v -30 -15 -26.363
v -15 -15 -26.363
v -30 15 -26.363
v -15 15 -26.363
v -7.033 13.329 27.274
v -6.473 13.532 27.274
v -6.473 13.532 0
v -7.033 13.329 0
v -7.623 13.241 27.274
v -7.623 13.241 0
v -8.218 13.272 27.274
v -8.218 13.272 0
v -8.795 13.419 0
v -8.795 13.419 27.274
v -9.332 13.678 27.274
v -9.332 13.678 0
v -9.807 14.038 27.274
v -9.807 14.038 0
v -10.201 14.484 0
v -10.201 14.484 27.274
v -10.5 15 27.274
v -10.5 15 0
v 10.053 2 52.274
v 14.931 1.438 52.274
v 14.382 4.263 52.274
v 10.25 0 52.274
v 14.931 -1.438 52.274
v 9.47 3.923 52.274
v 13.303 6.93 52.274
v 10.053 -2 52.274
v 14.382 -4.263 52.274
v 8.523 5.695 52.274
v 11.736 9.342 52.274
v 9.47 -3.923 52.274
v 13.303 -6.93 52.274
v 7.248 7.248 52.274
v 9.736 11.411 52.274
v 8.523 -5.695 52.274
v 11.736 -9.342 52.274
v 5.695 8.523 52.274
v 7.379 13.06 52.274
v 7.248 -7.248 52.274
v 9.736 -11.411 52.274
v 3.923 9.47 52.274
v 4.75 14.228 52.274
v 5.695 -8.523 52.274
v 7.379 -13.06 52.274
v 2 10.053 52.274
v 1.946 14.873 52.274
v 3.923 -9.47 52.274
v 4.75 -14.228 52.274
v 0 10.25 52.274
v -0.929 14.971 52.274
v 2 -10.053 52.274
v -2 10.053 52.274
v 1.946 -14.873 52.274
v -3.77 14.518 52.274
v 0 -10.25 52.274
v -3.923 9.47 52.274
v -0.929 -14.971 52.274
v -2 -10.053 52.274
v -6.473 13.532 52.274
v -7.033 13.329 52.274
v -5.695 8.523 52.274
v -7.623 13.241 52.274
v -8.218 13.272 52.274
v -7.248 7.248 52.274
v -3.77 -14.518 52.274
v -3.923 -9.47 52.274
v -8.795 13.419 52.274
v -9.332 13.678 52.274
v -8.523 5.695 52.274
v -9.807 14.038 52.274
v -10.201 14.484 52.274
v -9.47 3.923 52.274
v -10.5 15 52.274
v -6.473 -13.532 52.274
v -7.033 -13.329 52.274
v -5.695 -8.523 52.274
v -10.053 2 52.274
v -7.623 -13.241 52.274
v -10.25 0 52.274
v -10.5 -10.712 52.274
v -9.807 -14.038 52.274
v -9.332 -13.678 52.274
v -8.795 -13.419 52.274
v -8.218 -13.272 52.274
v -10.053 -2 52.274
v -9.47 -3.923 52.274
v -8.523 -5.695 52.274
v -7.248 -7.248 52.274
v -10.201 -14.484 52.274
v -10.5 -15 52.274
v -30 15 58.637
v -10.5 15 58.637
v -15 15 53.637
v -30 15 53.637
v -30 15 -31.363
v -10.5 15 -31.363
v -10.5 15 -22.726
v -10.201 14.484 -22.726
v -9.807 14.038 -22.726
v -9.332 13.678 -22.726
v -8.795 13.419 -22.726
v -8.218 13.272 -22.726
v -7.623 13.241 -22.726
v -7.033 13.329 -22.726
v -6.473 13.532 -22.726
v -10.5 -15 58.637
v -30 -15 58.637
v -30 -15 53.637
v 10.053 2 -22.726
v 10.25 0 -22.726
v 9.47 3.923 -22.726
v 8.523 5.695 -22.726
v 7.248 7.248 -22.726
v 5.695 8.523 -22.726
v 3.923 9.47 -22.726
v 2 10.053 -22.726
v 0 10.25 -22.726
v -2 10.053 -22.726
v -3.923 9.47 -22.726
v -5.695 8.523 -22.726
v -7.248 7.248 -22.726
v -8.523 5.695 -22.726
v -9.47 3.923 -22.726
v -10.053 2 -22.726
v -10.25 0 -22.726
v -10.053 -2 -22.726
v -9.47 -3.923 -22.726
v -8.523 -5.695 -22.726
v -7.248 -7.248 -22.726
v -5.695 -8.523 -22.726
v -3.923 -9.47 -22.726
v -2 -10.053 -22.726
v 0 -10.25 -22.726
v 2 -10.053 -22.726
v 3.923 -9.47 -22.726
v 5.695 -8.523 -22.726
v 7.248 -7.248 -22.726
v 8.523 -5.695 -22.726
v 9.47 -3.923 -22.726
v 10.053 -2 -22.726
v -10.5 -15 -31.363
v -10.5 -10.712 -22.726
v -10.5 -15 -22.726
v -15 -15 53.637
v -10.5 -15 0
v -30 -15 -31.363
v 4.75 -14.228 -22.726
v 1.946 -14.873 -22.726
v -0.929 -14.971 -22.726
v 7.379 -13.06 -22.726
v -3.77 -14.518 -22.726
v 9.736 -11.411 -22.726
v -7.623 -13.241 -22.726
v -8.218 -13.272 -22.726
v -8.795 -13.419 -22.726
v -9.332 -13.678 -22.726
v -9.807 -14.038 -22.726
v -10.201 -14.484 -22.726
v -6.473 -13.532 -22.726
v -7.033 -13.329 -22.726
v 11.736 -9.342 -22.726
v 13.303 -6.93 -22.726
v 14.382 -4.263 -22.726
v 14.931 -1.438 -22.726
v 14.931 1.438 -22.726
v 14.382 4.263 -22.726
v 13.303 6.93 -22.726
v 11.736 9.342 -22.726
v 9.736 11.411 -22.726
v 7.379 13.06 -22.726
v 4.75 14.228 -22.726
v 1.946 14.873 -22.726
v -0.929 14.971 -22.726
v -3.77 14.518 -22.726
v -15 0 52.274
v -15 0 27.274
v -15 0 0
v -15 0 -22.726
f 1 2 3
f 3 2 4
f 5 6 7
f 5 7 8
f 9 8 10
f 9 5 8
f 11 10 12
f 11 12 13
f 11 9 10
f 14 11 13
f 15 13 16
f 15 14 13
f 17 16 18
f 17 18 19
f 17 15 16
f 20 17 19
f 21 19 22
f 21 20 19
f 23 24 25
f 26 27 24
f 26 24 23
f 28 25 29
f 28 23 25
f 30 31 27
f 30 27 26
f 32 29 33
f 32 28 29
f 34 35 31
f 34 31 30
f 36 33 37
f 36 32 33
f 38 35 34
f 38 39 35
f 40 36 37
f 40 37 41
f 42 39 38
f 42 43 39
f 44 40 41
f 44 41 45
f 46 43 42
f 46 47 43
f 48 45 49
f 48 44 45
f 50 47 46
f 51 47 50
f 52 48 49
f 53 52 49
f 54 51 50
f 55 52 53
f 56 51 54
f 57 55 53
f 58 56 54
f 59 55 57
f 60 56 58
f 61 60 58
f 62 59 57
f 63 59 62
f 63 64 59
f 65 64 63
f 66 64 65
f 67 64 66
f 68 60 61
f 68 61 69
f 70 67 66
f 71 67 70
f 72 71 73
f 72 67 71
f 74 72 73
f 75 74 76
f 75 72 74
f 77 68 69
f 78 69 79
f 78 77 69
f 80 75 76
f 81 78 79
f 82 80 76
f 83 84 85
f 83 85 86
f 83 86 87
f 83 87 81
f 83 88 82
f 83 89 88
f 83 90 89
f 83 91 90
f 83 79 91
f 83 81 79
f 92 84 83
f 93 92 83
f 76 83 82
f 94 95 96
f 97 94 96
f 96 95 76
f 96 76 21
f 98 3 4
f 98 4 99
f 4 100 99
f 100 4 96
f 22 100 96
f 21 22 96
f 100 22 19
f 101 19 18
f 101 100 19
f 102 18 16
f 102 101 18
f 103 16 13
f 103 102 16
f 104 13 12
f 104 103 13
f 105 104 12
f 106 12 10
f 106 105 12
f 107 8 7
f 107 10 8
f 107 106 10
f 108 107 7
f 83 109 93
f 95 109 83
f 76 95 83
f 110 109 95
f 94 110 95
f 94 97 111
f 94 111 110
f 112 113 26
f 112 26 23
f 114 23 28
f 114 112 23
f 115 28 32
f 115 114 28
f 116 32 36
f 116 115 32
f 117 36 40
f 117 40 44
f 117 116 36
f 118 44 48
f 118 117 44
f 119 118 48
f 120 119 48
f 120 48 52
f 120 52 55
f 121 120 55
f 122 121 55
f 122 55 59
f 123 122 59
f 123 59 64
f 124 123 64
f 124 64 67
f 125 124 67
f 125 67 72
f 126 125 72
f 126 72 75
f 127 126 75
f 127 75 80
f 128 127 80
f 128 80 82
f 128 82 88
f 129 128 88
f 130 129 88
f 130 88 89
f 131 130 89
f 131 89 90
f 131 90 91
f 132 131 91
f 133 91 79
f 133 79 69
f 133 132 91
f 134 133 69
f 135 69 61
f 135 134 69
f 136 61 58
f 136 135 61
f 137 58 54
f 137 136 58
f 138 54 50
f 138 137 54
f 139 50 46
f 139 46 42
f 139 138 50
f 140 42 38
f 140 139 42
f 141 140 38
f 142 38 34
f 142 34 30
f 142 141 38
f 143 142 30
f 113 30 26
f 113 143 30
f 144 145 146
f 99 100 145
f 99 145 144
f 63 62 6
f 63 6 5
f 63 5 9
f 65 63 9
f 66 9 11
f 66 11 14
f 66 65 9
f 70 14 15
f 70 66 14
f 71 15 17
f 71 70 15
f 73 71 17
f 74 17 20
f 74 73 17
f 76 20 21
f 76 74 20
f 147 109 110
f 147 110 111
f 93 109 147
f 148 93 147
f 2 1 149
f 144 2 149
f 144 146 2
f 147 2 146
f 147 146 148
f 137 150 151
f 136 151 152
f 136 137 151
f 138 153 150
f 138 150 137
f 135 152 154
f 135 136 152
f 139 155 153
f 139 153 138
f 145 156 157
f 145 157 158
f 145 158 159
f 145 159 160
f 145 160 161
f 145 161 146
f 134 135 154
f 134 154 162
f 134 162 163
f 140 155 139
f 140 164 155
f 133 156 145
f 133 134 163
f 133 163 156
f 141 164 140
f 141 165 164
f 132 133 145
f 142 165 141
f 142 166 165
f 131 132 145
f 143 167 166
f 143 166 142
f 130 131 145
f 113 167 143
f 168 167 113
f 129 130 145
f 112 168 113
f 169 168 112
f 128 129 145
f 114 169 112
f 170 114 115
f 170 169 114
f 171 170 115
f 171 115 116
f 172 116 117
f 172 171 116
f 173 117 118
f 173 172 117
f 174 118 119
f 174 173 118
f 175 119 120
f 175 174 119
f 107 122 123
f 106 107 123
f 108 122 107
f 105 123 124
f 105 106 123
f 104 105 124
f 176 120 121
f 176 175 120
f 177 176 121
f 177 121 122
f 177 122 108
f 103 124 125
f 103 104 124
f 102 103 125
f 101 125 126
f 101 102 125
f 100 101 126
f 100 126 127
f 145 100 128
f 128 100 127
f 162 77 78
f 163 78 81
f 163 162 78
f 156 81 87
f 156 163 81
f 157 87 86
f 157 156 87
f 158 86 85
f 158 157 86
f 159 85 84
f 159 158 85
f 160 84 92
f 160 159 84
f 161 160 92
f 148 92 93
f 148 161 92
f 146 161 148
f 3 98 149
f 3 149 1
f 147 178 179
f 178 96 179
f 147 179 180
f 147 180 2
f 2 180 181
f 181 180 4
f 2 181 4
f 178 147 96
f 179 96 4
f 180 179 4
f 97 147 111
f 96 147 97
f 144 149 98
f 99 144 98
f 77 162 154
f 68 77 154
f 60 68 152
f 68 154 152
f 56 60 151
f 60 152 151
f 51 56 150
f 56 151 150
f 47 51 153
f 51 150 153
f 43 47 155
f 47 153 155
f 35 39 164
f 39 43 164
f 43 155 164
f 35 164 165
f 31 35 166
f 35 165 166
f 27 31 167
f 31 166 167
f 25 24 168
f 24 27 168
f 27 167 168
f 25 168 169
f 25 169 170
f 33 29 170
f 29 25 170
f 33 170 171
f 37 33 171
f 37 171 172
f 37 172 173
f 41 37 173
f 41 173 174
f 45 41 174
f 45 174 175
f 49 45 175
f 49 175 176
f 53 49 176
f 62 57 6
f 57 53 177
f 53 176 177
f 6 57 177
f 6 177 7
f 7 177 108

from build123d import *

# Parameters (mm, degrees)
SKETCH_1_W            = 30
SKETCH_1_H            = 30
SKETCH_1_R            = 9.807439468
EXTRUDE_1_DEPTH       = 60
SKETCH_2_W            = 30
SKETCH_2_H            = 30
SKETCH_2_R            = 10.25
EXTRUDE_2_DEPTH       = 50
SKETCH_6_R            = 10.25
CUT_EXTRUDE_1_DEPTH   = 60
SKETCH_7_W            = 30
SKETCH_7_H            = 30
SKETCH_7_R            = 10.25
REVOLVE_1_ANGLE       = 90
FILLET_2_R            = 15
SKETCH_9_W            = 65.452723958
SKETCH_9_H            = 141.93468868
CUT_EXTRUDE_3_DEPTH   = 30
SKETCH_19_W           = 90
SKETCH_19_H           = 60
EXTRUDE_9_DEPTH       = 4.5
SKETCH_20_W           = 5
SKETCH_20_H           = 60
EXTRUDE_10_DEPTH      = 15
EXTRUDE_11_DEPTH      = 25
EXTRUDE_11_DEPTH_BACK = 50
SKETCH_22_R           = 15
SKETCH_22_R_2         = 10.25
SKETCH_26_W           = 90
SKETCH_26_H           = 15
CUT_EXTRUDE_4_DEPTH   = 20
FILLET_4_R            = 3


with BuildPart() as part:
    # 스케치1 → 보스-돌출1 (new body)
    with BuildSketch(Plane.XY):
        Rectangle(SKETCH_1_W, SKETCH_1_H)
        Circle(SKETCH_1_R, mode=Mode.SUBTRACT)
    extrude(amount=EXTRUDE_1_DEPTH)

    # 스케치6 → 컷-돌출1 (cut)
    with BuildSketch(Plane.XY.offset(60)):
        Circle(SKETCH_6_R)
    extrude(amount=-CUT_EXTRUDE_1_DEPTH, mode=Mode.SUBTRACT)



with BuildPart() as body_2:
    # 스케치2 → 보스-돌출2 (new body)
    with BuildSketch(Plane.XZ.offset(15)):
        with Locations((0, 75)):
            Rectangle(SKETCH_2_W, SKETCH_2_H)
        with Locations((0, 75)):
            Circle(SKETCH_2_R, mode=Mode.SUBTRACT)
    extrude(amount=EXTRUDE_2_DEPTH)


with BuildPart() as part_1:
    add(part.part)

    add(body_2.part)  # 회전1 merges body 2
    # 스케치7 → 회전1 (revolve)
    with BuildSketch(Plane(origin=(0, -15, 0), x_dir=(1, 0, 0), z_dir=(0, 1, 0))):
        with Locations((0, -75)):
            Rectangle(SKETCH_7_W, SKETCH_7_H)
        with Locations(Location((0, -75, 0), (0, 0, 270))):
            Circle(SKETCH_7_R, mode=Mode.SUBTRACT)
    revolve(axis=Axis((15, -15, 60), (-1, 0, 0)), revolution_arc=REVOLVE_1_ANGLE)

    # 필렛2
    # the kernel refuses this fillet: 15 mm, written as the material it adds along each edge
    with BuildSketch(Plane(origin=(15, -15, 60), x_dir=(0, 0, -1), z_dir=(-1, 0, 0))) as fillet_2_piece_1:
        with BuildLine():
            CenterArc((FILLET_2_R, FILLET_2_R), FILLET_2_R, 180, 90)
            Line((0, FILLET_2_R), (0, 0))
            Line((0, 0), (FILLET_2_R, 0))
        make_face()
    extrude(amount=30)
    # the kernel refuses this fillet: 15 mm, written as the material it takes off along each edge
    with BuildSketch(Plane(origin=(15, -15, 60), x_dir=(0, 0, 1), z_dir=(0, -1, 0))) as fillet_2_2_piece_1:
        with BuildLine():
            CenterArc((30 - FILLET_2_R, FILLET_2_R), FILLET_2_R, 270, 90)
            Line((30, FILLET_2_R), (30, 0))
            Line((30, 0), (30 - FILLET_2_R, 0))
        make_face()
    revolve(axis=Axis((15, -15, 60), (-1, 0, 0)), revolution_arc=90, mode=Mode.SUBTRACT)
    with BuildSketch(Plane(origin=(-15, -15, 60), x_dir=(0, 0, 1), z_dir=(0, -1, 0))) as fillet_2_2_piece_2:
        with BuildLine():
            CenterArc((30 - FILLET_2_R, -FILLET_2_R), FILLET_2_R, 0, 90)
            Line((30, -FILLET_2_R), (30, 0))
            Line((30, 0), (30 - FILLET_2_R, 0))
        make_face()
    revolve(axis=Axis((-15, -15, 60), (-1, 0, 0)), revolution_arc=90, mode=Mode.SUBTRACT)
    with BuildSketch(Plane(origin=(-15, 15, -37.5), x_dir=(0, -1, 0), z_dir=(0, 0, 1))) as fillet_2_2_piece_3:
        with BuildLine():
            CenterArc((FILLET_2_R, FILLET_2_R), FILLET_2_R, 180, 90)
            Line((0, FILLET_2_R), (0, 0))
            Line((0, 0), (FILLET_2_R, 0))
        make_face()
    extrude(amount=97.5, mode=Mode.SUBTRACT)
    with BuildSketch(Plane(origin=(15, 15, -37.5), x_dir=(0, -1, 0), z_dir=(0, 0, 1))) as fillet_2_2_piece_4:
        with BuildLine():
            CenterArc((FILLET_2_R, -FILLET_2_R), FILLET_2_R, 90, 90)
            Line((0, -FILLET_2_R), (0, 0))
            Line((0, 0), (FILLET_2_R, 0))
        make_face()
    extrude(amount=97.5, mode=Mode.SUBTRACT)
    with BuildSketch(Plane(origin=(-15, -15, 90), x_dir=(0, 0, -1), z_dir=(0, -1, 0))) as fillet_2_2_piece_5:
        with BuildLine():
            CenterArc((FILLET_2_R, FILLET_2_R), FILLET_2_R, 180, 90)
            Line((0, FILLET_2_R), (0, 0))
            Line((0, 0), (FILLET_2_R, 0))
        make_face()
    extrude(amount=87.5, mode=Mode.SUBTRACT)
    with BuildSketch(Plane(origin=(15, -15, 90), x_dir=(0, 0, -1), z_dir=(0, -1, 0))) as fillet_2_2_piece_6:
        with BuildLine():
            CenterArc((FILLET_2_R, -FILLET_2_R), FILLET_2_R, 90, 90)
            Line((0, -FILLET_2_R), (0, 0))
            Line((0, 0), (FILLET_2_R, 0))
        make_face()
    extrude(amount=87.5, mode=Mode.SUBTRACT)
    # the kernel refuses this fillet: 15 mm, written as the material it takes off along each edge
    with BuildSketch(Plane(origin=(-15, -15, 45), x_dir=(1, 0, 0), z_dir=(0, 0, -1)), Plane(origin=(15, -15, -37.5), x_dir=(-1, 0, 0), z_dir=(0, 0, 1))) as fillet_2_3_piece_1:
        with BuildLine():
            CenterArc((FILLET_2_R, -FILLET_2_R), FILLET_2_R, 90, 90)
            Line((0, -FILLET_2_R), (0, 0))
            Line((0, 0), (FILLET_2_R, 0))
        make_face()
    extrude(amount=82.5, mode=Mode.SUBTRACT)
    with BuildSketch(Plane(origin=(15, -30, 60), x_dir=(0, 0, 1), z_dir=(0, -1, 0))) as fillet_2_3_piece_2:
        with BuildLine():
            CenterArc((FILLET_2_R, FILLET_2_R), FILLET_2_R, 180, 90)
            Line((0, FILLET_2_R), (0, 0))
            Line((0, 0), (FILLET_2_R, 0))
        make_face()
    extrude(amount=72.5, mode=Mode.SUBTRACT)
    with BuildSketch(Plane(origin=(-15, -30, 60), x_dir=(0, 0, 1), z_dir=(0, -1, 0))) as fillet_2_3_piece_3:
        with BuildLine():
            CenterArc((FILLET_2_R, -FILLET_2_R), FILLET_2_R, 90, 90)
            Line((0, -FILLET_2_R), (0, 0))
            Line((0, 0), (FILLET_2_R, 0))
        make_face()
    extrude(amount=72.5, mode=Mode.SUBTRACT)
    with BuildSketch(Plane(origin=(-15, -30, 45), x_dir=(0, 1, 0), z_dir=(0, 0, -1))) as fillet_2_3_piece_4:
        with BuildLine():
            CenterArc((15 + FILLET_2_R, FILLET_2_R), FILLET_2_R, 180, 90)
            Line((15, FILLET_2_R), (15, 0))
            Line((15, 0), (15 + FILLET_2_R, 0))
        make_face()
    revolve(axis=Axis((-15, -30, 45), (1, 0, 0)), revolution_arc=90, mode=Mode.SUBTRACT)
    with BuildSketch(Plane(origin=(15, -30, 45), x_dir=(0, 1, 0), z_dir=(0, 0, -1))) as fillet_2_3_piece_5:
        with BuildLine():
            CenterArc((15 + FILLET_2_R, -FILLET_2_R), FILLET_2_R, 90, 90)
            Line((15 + FILLET_2_R, 0), (15, 0))
            Line((15, 0), (15, -FILLET_2_R))
        make_face()
    revolve(axis=Axis((15, -30, 45), (1, 0, 0)), revolution_arc=90, mode=Mode.SUBTRACT)

    # 스케치9 → 컷-돌출3 (cut)
    with BuildSketch(Plane(origin=(15, 0, 0), x_dir=(0, 0, -1), z_dir=(1, 0, 0))):
        with Locations((-60, 0)):
            Rectangle(SKETCH_9_W, SKETCH_9_H)
    extrude(amount=-CUT_EXTRUDE_3_DEPTH, mode=Mode.SUBTRACT)

    # 스케치19 → 보스-돌출9 (add)
    with BuildSketch(Plane(origin=(-15, -15, 60), x_dir=(0, 0, -1), z_dir=(1, 0, 0))):
        with Locations((46.36318099, 15)):
            Rectangle(SKETCH_19_W, SKETCH_19_H)
    extrude(amount=EXTRUDE_9_DEPTH)

    # 스케치20 → 보스-돌출10 (add)
    with BuildSketch(Plane.ZY.offset(15)):
        with Locations((56.13681901, 0)):
            Rectangle(SKETCH_20_W, SKETCH_20_H)
        with Locations((-28.86318099, 0)):
            Rectangle(SKETCH_20_W, SKETCH_20_H)
    extrude(amount=EXTRUDE_10_DEPTH)

    # 스케치22 → 보스-돌출11 (add, two sides: drawn at the far end of the back side and taken through both)
    with BuildSketch(Plane.XY.offset(27.273638021).offset(-EXTRUDE_11_DEPTH_BACK)):
        Circle(SKETCH_22_R)
        Circle(SKETCH_22_R_2, mode=Mode.SUBTRACT)
    extrude(amount=EXTRUDE_11_DEPTH + EXTRUDE_11_DEPTH_BACK)

    # 스케치26 → 컷-돌출4 (cut)
    with BuildSketch(Plane(origin=(-10.5, 0, 0), x_dir=(0, 0, -1), z_dir=(1, 0, 0))):
        with Locations((-13.63681901, -22.5)):
            Rectangle(SKETCH_26_W, SKETCH_26_H)
        with Locations((-13.63681901, 22.5)):
            Rectangle(SKETCH_26_W, SKETCH_26_H)
    extrude(amount=-CUT_EXTRUDE_4_DEPTH, mode=Mode.SUBTRACT)

    # 필렛4
    # the kernel refuses this fillet: 3 mm, written as the material it adds along each edge
    with BuildSketch(Plane(origin=(-10.5, -10.712142643, 27.273638021), x_dir=(0.8191977687507059, -0.573511129511769, 0), z_dir=(0, 0, -1))) as fillet_4_piece_1:
        with BuildLine():
            CenterArc((5.4076958, 2.959446042), FILLET_4_R, 169.374679788, 91.193748437)
            Line((2.459133916, 3.51260318), (2.400162678, 3.523666322))
            ThreePointArc((2.400162678, 3.523666322), (1.180415092, 1.790712258), (-0.049151866, 0.034410668))
            Line((-0.049151866, 0.034410668), (0.009832174, -0.059188921))
            ThreePointArc((0.009832174, -0.059188921), (2.458043545, 0.142769789), (4.906254916, -0.059188921))
            Line((4.906254916, -0.059188921), (4.916087091, 0))
        make_face()
    extrude(amount=27.273638021)
    with BuildSketch(Plane(origin=(-10.5, 10.712142643, 27.273638021), x_dir=(0.8191977687507056, 0.5735111295117695, 0), z_dir=(0, 0, -1))) as fillet_4_piece_2:
        with BuildLine():
            CenterArc((5.4076958, -2.959446042), FILLET_4_R, 99.431571775, 91.193748437)
            Line((2.459133916, -3.51260318), (2.400162678, -3.523666322))
            ThreePointArc((2.400162678, -3.523666322), (1.180415092, -1.790712258), (-0.049151866, -0.034410668))
            Line((-0.049151866, -0.034410668), (0.009832174, 0.059188921))
            ThreePointArc((0.009832174, 0.059188921), (2.458043545, -0.142769789), (4.906254916, 0.059188921))
            Line((4.906254916, 0.059188921), (4.916087091, 0))
        make_face()
    extrude(amount=27.273638021)
    with BuildSketch(Plane(origin=(-10.5, 10.712142643, 52.273638021), x_dir=(0, 1, 0), z_dir=(0, 0, -1))) as fillet_4_piece_3:
        with BuildLine():
            CenterArc((5.525745321, 2.732697091), FILLET_4_R, 154.43613955, 91.193748437)
            Line((2.81943066, 4.027247576), (2.765304367, 4.053138585))
            ThreePointArc((2.765304367, 4.053138585), (1.526672022, 1.931743725), (-0.042848571, 0.042))
            Line((-0.042848571, 0.042), (0, -0.06))
            ThreePointArc((0, -0.06), (2.143928679, -0.06), (4.263099598, -0.054653942))
            Line((4.263099598, -0.054653942), (4.287857357, 0))
        make_face()
    extrude(amount=25)
    with BuildSketch(Plane(origin=(-10.5, 10.712142643, -22.726361979), x_dir=(0, 1, 0), z_dir=(0, 0, 1))) as fillet_4_piece_4:
        with BuildLine():
            CenterArc((5.525745321, -2.732697091), FILLET_4_R, 114.370112013, 91.193748437)
            Line((2.81943066, -4.027247576), (2.765304367, -4.053138585))
            ThreePointArc((2.765304367, -4.053138585), (1.526672022, -1.931743725), (-0.042848571, -0.042))
            Line((-0.042848571, -0.042), (0, 0.06))
            ThreePointArc((0, 0.06), (2.143928679, 0.06), (4.263099598, 0.054653942))
            Line((4.263099598, 0.054653942), (4.287857357, 0))
        make_face()
    extrude(amount=22.726361979)
    with BuildSketch(Plane(origin=(-10.5, -10.712142643, 52.273638021), x_dir=(0.8191977687507062, -0.5735111295117684, 0), z_dir=(0, 0, -1))) as fillet_4_piece_5:
        with BuildLine():
            CenterArc((5.4076958, 2.959446042), FILLET_4_R, 169.374679788, 91.193748437)
            Line((2.459133916, 3.51260318), (2.400162678, 3.523666322))
            ThreePointArc((2.400162678, 3.523666322), (1.180415092, 1.790712258), (-0.049151866, 0.034410668))
            Line((-0.049151866, 0.034410668), (0.009832174, -0.059188921))
            ThreePointArc((0.009832174, -0.059188921), (2.458043545, 0.142769789), (4.906254916, -0.059188921))
            Line((4.906254916, -0.059188921), (4.916087091, 0))
        make_face()
    extrude(amount=25)
    with BuildSketch(Plane(origin=(-10.5, -10.712142643, -22.726361979), x_dir=(0.8191977687507059, -0.5735111295117687, 0), z_dir=(0, 0, 1))) as fillet_4_piece_6:
        with BuildLine():
            CenterArc((5.4076958, -2.959446042), FILLET_4_R, 99.431571775, 91.193748437)
            Line((2.459133916, -3.51260318), (2.400162678, -3.523666322))
            ThreePointArc((2.400162678, -3.523666322), (1.180415092, -1.790712258), (-0.049151866, -0.034410668))
            Line((-0.049151866, -0.034410668), (0.009832174, 0.059188921))
            ThreePointArc((0.009832174, 0.059188921), (2.458043545, -0.142769789), (4.906254916, 0.059188921))
            Line((4.906254916, 0.059188921), (4.916087091, 0))
        make_face()
    extrude(amount=22.726361979)


solid = part_1.part
